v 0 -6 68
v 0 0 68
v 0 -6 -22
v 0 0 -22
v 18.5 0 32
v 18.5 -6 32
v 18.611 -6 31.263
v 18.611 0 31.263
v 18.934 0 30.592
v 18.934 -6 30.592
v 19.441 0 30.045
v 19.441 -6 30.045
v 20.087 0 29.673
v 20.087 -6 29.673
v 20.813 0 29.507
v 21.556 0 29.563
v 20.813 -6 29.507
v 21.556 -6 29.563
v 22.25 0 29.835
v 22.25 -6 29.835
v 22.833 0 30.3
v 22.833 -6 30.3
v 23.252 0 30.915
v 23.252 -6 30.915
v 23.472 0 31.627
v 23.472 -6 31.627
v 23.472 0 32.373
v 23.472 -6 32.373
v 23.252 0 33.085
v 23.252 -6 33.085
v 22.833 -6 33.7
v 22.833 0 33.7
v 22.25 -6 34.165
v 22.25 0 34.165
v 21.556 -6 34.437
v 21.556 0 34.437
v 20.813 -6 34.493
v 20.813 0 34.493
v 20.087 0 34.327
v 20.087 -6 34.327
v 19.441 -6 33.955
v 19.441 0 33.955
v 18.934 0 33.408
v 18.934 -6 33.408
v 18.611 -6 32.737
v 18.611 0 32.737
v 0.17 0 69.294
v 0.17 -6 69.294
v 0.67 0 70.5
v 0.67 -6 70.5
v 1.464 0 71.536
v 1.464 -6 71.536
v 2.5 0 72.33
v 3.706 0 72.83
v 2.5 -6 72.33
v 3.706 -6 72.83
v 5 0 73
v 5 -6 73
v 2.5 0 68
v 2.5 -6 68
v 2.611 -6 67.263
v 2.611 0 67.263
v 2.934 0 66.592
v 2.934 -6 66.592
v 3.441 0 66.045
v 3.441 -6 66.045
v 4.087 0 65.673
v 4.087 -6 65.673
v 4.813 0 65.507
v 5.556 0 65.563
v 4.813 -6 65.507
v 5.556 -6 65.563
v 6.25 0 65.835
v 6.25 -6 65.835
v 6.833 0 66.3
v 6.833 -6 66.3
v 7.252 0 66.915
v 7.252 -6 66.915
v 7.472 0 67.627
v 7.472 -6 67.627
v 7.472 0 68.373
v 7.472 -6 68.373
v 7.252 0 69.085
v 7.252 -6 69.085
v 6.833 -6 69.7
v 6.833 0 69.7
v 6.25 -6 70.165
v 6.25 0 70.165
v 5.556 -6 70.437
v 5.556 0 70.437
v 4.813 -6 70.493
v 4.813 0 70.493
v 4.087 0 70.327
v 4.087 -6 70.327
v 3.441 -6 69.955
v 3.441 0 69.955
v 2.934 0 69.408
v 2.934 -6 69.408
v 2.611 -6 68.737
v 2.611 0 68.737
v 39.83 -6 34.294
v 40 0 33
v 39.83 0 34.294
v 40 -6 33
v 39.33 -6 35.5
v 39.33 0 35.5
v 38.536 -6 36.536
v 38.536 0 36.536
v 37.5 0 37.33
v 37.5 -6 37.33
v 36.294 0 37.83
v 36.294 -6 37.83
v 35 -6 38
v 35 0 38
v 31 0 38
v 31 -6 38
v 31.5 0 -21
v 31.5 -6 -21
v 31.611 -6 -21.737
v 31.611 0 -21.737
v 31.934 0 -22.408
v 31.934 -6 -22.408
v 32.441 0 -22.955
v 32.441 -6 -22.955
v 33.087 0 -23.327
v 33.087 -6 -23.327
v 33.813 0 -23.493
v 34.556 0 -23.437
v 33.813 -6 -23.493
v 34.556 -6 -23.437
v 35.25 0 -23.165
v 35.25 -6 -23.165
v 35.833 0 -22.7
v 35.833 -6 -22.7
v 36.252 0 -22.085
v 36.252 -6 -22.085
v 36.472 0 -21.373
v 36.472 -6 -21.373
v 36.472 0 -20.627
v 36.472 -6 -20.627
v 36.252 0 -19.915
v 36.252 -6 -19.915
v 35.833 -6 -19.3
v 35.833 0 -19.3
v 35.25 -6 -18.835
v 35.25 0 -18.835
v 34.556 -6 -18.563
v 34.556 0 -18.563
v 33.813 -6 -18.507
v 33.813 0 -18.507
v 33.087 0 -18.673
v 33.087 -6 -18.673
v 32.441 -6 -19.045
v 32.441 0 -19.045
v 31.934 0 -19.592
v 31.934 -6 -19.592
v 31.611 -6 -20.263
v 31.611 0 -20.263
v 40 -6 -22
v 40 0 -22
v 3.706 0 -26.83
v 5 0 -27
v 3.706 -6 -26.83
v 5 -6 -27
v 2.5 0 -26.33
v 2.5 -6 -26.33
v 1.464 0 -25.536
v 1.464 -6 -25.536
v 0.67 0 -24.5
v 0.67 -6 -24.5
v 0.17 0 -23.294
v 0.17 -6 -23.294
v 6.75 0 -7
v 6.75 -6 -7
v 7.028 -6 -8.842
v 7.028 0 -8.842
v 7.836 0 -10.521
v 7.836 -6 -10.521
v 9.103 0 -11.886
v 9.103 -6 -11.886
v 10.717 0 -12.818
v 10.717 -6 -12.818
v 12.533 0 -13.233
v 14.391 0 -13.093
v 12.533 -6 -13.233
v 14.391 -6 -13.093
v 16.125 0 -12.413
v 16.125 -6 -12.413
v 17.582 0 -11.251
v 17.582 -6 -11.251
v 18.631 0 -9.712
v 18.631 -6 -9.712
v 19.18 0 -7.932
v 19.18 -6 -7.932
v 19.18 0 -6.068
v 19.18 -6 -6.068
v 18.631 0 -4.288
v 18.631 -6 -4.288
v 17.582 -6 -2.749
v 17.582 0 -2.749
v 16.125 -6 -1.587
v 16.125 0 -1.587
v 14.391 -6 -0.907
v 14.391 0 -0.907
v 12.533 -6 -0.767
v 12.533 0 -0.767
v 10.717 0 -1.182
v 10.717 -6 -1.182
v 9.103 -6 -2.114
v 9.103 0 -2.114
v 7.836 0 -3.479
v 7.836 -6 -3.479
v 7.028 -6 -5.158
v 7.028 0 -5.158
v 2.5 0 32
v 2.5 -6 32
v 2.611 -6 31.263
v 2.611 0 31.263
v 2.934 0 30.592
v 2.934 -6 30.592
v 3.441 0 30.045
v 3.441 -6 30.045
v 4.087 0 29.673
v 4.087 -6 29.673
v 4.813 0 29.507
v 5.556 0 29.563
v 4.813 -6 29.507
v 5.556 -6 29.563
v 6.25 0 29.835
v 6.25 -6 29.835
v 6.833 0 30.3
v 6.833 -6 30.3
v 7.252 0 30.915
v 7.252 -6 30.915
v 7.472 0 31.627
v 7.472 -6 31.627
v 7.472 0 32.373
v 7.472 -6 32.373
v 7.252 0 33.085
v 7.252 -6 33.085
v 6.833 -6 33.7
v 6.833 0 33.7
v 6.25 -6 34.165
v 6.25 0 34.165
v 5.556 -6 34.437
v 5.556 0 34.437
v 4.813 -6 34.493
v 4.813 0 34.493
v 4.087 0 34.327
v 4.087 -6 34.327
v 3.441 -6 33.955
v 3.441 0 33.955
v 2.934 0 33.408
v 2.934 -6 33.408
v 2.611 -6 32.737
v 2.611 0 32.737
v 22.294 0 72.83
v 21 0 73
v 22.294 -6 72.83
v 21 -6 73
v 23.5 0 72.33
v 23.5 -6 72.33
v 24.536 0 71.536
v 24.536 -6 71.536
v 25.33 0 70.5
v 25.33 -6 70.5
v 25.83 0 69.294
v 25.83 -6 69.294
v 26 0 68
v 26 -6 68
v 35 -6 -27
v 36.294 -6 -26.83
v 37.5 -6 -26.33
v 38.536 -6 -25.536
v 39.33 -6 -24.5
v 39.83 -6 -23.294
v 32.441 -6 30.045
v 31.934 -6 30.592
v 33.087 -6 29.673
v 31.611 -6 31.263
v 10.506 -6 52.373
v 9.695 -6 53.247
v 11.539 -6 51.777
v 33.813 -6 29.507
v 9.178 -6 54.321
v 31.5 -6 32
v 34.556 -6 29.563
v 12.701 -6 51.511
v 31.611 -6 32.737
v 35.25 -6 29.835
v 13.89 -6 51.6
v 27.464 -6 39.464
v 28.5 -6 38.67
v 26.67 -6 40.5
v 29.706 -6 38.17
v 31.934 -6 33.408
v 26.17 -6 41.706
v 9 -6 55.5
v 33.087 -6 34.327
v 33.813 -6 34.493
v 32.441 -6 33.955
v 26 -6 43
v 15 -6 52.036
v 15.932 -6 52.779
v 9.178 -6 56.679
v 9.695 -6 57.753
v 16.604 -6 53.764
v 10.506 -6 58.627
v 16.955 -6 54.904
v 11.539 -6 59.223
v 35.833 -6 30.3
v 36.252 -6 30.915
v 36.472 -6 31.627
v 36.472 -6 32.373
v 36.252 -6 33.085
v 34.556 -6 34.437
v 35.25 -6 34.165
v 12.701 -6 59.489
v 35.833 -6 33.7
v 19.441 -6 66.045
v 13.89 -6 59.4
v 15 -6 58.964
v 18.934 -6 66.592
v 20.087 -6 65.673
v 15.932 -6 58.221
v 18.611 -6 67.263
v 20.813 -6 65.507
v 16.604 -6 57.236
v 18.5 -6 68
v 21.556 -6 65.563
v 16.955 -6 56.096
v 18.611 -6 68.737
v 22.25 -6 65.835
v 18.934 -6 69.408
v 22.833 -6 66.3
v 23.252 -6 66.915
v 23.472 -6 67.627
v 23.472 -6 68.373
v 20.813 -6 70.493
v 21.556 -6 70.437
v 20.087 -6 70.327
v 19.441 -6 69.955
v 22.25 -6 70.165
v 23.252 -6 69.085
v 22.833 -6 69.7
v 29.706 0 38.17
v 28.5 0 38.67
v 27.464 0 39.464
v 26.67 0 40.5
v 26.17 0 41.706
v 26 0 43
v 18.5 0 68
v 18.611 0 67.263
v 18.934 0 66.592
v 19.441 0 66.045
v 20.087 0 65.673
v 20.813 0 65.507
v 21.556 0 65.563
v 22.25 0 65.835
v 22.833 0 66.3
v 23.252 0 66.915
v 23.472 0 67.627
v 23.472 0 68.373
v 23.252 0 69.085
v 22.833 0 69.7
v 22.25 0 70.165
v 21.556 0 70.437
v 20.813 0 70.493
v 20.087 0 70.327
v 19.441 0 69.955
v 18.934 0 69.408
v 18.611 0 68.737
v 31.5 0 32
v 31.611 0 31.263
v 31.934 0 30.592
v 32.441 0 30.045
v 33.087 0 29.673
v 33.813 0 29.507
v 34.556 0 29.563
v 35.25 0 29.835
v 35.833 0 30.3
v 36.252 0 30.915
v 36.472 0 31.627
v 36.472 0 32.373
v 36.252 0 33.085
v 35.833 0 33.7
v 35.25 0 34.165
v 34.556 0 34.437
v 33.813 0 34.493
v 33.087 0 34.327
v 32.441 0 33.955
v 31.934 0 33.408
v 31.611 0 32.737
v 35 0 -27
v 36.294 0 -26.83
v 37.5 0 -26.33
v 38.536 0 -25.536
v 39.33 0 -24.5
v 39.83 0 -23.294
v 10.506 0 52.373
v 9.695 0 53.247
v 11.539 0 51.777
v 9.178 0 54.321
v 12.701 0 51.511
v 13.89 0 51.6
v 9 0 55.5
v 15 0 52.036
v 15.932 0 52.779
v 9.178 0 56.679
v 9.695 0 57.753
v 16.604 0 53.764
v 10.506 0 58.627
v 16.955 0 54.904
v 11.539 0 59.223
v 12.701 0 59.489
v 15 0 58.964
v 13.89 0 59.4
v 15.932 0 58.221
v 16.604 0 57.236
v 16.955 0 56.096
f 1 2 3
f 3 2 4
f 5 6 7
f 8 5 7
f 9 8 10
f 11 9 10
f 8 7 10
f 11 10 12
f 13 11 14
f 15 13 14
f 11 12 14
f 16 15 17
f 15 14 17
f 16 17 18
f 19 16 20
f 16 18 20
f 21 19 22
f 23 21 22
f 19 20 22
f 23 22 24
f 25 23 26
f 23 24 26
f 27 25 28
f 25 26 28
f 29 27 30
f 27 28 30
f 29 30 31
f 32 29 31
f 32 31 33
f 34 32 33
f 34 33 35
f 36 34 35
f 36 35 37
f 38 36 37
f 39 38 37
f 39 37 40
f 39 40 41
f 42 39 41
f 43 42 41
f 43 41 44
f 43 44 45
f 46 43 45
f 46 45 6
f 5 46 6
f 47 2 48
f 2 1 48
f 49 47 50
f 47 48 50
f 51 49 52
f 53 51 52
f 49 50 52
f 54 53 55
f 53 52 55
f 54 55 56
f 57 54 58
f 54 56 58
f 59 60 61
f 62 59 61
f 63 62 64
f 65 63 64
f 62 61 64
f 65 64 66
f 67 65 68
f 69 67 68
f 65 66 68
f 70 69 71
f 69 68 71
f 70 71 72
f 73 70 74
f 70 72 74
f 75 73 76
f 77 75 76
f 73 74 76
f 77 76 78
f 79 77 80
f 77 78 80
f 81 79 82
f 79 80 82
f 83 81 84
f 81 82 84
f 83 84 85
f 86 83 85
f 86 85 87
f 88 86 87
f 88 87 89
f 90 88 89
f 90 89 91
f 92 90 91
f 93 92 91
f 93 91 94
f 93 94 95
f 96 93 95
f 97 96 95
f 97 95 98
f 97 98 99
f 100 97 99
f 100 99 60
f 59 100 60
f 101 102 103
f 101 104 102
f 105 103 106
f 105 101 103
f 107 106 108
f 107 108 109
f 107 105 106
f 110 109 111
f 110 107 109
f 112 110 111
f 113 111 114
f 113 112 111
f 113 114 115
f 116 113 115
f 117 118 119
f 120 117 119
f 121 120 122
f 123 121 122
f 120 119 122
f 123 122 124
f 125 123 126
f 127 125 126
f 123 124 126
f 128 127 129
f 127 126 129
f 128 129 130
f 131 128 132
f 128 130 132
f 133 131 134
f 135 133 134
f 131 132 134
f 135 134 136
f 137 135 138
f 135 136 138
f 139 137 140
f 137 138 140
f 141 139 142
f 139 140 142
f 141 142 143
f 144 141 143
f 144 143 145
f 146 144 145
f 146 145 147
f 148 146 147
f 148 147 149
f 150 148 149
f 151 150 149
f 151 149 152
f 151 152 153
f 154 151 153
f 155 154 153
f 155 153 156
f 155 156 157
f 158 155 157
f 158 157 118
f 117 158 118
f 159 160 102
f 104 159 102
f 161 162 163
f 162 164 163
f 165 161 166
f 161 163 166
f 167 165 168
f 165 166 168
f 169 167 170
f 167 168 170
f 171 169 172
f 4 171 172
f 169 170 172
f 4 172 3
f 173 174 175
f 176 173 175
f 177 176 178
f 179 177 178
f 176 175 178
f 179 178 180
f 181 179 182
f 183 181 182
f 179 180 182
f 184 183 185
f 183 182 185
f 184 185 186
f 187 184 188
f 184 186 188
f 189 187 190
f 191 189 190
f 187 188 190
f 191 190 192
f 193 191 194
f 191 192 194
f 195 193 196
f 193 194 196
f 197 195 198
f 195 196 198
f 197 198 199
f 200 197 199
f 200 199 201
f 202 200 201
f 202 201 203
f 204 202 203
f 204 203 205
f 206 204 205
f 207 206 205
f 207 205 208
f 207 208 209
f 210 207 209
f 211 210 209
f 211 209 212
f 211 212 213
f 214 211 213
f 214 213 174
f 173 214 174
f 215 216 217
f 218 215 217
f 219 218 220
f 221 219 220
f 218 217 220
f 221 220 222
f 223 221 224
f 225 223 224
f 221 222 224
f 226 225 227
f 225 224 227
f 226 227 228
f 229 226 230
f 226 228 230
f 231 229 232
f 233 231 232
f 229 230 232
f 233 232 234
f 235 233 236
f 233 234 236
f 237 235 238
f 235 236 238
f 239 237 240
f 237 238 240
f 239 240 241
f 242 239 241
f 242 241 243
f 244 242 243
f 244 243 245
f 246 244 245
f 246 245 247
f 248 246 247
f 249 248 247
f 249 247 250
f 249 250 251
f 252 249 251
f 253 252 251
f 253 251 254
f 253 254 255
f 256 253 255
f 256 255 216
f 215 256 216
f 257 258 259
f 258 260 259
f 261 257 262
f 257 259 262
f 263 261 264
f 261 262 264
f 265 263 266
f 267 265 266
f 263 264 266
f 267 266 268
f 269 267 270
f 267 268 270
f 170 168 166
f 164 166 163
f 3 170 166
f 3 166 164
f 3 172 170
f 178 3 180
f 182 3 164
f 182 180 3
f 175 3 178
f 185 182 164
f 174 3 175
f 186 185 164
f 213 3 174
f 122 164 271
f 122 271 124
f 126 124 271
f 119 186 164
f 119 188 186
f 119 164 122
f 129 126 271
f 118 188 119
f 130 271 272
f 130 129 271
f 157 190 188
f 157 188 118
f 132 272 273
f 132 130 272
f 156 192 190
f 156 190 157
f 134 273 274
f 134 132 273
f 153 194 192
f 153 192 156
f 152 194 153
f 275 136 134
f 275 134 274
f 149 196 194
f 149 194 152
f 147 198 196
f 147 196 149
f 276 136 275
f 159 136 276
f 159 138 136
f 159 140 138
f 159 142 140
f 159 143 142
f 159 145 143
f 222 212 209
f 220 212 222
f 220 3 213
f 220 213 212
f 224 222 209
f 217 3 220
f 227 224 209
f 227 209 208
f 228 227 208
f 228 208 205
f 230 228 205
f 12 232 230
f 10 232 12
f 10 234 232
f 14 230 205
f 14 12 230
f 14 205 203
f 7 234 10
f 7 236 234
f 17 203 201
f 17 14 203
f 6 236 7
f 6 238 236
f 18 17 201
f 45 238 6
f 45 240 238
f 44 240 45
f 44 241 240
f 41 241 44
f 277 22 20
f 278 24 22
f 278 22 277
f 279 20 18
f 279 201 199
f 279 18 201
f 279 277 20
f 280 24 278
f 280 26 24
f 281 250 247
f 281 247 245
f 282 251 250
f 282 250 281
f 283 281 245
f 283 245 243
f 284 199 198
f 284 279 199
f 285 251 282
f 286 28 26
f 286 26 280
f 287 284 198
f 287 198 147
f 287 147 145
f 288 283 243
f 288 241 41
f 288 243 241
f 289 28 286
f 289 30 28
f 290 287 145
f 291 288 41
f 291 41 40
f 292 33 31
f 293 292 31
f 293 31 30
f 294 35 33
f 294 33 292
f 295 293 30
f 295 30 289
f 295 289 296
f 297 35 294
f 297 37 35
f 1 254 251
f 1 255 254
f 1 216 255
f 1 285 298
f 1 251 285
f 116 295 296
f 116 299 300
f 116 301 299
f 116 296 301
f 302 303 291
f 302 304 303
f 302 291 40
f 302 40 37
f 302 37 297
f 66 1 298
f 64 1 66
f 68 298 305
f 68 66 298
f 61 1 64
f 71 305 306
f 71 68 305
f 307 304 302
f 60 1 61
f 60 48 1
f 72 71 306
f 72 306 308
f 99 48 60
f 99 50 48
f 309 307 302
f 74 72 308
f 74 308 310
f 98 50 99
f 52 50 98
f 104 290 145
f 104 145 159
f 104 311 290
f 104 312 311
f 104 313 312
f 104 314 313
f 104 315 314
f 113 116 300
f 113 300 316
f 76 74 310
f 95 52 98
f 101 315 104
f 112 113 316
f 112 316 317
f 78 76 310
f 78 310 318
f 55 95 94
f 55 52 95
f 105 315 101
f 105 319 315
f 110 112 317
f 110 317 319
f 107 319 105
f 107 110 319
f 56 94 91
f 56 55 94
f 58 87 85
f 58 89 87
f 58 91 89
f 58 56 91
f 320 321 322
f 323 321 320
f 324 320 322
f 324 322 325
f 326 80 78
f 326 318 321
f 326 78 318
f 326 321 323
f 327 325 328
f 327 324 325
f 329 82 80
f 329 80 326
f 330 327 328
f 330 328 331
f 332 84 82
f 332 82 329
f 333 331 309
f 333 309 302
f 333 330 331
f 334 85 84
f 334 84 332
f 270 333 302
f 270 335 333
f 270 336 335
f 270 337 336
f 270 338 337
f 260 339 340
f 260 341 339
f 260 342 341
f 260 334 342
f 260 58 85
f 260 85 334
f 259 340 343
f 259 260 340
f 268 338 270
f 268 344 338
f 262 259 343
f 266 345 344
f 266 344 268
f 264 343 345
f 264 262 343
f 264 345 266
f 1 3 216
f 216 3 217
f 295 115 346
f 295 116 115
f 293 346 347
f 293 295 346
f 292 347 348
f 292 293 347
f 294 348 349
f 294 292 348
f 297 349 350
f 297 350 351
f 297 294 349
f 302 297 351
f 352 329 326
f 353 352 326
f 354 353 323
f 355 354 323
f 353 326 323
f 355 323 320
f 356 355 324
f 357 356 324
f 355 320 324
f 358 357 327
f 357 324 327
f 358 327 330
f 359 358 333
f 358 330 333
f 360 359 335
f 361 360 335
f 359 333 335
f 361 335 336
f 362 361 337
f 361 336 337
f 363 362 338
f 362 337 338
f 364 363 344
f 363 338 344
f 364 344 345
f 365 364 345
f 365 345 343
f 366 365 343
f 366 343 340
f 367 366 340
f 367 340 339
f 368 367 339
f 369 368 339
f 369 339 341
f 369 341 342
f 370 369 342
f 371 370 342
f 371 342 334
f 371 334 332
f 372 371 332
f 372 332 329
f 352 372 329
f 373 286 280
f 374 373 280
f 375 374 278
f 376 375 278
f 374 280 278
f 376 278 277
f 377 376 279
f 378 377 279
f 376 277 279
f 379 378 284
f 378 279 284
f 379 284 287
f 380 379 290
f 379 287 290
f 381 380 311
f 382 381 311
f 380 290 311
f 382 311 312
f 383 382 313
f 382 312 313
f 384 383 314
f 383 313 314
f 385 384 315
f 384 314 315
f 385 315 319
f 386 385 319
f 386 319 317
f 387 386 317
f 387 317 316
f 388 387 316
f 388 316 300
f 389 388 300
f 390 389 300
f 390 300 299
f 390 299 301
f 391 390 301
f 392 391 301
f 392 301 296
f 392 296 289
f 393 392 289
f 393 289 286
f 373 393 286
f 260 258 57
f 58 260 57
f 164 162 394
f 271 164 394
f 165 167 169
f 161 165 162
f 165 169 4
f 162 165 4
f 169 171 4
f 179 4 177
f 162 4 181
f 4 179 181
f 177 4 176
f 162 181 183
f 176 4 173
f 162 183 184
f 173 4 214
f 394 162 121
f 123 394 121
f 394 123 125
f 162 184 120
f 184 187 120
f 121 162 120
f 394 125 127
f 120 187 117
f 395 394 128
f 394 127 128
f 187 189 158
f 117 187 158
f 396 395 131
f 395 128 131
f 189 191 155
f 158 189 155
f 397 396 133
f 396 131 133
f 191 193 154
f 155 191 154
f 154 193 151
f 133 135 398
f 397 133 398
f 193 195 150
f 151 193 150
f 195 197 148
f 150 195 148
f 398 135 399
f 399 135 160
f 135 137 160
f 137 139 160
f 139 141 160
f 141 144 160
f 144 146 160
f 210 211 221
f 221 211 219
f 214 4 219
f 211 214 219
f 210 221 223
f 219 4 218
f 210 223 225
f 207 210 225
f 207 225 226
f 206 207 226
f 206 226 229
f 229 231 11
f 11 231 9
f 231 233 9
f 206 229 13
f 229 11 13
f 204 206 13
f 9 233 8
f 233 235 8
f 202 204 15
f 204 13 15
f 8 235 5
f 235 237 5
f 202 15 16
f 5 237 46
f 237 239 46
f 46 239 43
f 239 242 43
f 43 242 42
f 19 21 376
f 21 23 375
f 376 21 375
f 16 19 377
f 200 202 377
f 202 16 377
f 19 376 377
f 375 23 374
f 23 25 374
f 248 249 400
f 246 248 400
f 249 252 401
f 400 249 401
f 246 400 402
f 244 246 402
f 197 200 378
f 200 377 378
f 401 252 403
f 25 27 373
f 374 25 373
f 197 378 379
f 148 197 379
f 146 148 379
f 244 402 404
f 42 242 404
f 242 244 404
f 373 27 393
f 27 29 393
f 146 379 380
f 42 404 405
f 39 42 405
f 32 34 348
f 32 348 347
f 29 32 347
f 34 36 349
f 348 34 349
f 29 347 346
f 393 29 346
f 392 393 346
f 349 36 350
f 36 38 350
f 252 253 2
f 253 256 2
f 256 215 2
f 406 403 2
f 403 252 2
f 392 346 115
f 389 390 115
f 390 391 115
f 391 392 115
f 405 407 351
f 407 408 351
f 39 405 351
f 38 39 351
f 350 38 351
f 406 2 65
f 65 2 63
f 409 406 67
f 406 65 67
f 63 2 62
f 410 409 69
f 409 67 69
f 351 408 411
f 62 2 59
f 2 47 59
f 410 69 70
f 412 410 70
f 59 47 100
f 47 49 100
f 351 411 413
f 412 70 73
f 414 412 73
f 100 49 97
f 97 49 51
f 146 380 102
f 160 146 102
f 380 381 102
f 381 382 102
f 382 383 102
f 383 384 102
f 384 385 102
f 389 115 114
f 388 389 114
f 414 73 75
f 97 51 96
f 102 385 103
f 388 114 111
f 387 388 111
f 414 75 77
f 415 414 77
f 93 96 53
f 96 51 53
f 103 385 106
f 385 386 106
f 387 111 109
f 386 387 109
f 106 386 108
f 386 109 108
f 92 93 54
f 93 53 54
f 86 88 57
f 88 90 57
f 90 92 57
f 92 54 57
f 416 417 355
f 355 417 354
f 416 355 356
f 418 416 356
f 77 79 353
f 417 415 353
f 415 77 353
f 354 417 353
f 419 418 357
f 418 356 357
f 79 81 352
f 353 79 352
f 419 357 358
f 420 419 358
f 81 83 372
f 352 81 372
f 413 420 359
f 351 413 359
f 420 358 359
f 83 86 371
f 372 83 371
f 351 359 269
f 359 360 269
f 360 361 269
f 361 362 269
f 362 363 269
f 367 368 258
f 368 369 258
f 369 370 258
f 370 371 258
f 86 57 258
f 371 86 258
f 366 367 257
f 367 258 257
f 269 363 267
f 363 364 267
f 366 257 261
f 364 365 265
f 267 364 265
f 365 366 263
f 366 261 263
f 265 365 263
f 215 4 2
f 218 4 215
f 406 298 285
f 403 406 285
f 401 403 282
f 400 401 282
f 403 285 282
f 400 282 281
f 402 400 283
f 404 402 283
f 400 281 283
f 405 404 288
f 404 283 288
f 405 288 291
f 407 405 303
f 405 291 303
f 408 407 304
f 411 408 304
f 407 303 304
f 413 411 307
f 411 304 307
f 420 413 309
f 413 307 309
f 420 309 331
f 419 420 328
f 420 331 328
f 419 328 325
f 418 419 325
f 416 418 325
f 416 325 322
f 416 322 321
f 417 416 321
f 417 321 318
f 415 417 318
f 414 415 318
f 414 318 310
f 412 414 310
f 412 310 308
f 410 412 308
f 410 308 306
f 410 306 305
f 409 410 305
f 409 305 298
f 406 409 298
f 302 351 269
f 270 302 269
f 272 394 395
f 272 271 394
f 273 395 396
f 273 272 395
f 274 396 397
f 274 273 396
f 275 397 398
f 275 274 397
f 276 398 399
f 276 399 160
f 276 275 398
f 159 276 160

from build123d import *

# Parameters (mm, degrees)
F1_DEPTH = 6
F2_D     = 12.5
F3_D     = 5
F4_D     = 5
F5_D     = 5
F6_R     = 5
F7_D     = 8
F7_DEPTH = 20
F7_TIP   = 2.4034424761


with BuildPart() as f1:
    # F0 (on Front) → F1 (new body)
    with BuildSketch(Plane.XZ):
        Polygon((0, 27), (0, -27), (13, -27), (40, -27), (40, 38), (26, 38), (26, 73), (0, 73), align=None)
    extrude(amount=F1_DEPTH)

    # F2 (through all)
    with Locations(Plane(origin=(0, 0, 0), x_dir=(1, 0, 0), z_dir=(0, 1, 0))):
        with Locations((13, 7)):
            Hole(F2_D / 2)

    # F3 (through all)
    with Locations(Plane(origin=(0, 0, 0), x_dir=(1, 0, 0), z_dir=(0, 1, 0))):
        with Locations((34, 21), (34, -32)):
            Hole(F3_D / 2)

    # F4 (through all)
    with Locations(Plane(origin=(0, 0, 0), x_dir=(1, 0, 0), z_dir=(0, 1, 0))):
        with Locations((5, -32), (21, -32)):
            Hole(F4_D / 2)

    # F5 (through all)
    with Locations(Plane(origin=(0, 0, 0), x_dir=(1, 0, 0), z_dir=(0, 1, 0))):
        with Locations((5, -68), (21, -68)):
            Hole(F5_D / 2)

    # F6
    f6_edges = [f1.edges().sort_by_distance(p)[0] for p in [
        (0, -3, 73),
        (26, -3, 73),
        (26, -3, 38),
        (40, -3, 38),
        (40, -3, -27),
        (0, -3, -27),
    ]]
    fillet(f6_edges, radius=F6_R)

    # F7
    with Locations(Plane(origin=(0, 0, 0), x_dir=(1, 0, 0), z_dir=(0, 1, 0))):
        with Locations((13, -55.5)):
            Hole(F7_D / 2, depth=F7_DEPTH)
            with Locations((0, 0, -(F7_DEPTH + F7_TIP / 2))):  # 118° drill point
                Cone(0, F7_D / 2, F7_TIP, mode=Mode.SUBTRACT)


solid = f1.part
